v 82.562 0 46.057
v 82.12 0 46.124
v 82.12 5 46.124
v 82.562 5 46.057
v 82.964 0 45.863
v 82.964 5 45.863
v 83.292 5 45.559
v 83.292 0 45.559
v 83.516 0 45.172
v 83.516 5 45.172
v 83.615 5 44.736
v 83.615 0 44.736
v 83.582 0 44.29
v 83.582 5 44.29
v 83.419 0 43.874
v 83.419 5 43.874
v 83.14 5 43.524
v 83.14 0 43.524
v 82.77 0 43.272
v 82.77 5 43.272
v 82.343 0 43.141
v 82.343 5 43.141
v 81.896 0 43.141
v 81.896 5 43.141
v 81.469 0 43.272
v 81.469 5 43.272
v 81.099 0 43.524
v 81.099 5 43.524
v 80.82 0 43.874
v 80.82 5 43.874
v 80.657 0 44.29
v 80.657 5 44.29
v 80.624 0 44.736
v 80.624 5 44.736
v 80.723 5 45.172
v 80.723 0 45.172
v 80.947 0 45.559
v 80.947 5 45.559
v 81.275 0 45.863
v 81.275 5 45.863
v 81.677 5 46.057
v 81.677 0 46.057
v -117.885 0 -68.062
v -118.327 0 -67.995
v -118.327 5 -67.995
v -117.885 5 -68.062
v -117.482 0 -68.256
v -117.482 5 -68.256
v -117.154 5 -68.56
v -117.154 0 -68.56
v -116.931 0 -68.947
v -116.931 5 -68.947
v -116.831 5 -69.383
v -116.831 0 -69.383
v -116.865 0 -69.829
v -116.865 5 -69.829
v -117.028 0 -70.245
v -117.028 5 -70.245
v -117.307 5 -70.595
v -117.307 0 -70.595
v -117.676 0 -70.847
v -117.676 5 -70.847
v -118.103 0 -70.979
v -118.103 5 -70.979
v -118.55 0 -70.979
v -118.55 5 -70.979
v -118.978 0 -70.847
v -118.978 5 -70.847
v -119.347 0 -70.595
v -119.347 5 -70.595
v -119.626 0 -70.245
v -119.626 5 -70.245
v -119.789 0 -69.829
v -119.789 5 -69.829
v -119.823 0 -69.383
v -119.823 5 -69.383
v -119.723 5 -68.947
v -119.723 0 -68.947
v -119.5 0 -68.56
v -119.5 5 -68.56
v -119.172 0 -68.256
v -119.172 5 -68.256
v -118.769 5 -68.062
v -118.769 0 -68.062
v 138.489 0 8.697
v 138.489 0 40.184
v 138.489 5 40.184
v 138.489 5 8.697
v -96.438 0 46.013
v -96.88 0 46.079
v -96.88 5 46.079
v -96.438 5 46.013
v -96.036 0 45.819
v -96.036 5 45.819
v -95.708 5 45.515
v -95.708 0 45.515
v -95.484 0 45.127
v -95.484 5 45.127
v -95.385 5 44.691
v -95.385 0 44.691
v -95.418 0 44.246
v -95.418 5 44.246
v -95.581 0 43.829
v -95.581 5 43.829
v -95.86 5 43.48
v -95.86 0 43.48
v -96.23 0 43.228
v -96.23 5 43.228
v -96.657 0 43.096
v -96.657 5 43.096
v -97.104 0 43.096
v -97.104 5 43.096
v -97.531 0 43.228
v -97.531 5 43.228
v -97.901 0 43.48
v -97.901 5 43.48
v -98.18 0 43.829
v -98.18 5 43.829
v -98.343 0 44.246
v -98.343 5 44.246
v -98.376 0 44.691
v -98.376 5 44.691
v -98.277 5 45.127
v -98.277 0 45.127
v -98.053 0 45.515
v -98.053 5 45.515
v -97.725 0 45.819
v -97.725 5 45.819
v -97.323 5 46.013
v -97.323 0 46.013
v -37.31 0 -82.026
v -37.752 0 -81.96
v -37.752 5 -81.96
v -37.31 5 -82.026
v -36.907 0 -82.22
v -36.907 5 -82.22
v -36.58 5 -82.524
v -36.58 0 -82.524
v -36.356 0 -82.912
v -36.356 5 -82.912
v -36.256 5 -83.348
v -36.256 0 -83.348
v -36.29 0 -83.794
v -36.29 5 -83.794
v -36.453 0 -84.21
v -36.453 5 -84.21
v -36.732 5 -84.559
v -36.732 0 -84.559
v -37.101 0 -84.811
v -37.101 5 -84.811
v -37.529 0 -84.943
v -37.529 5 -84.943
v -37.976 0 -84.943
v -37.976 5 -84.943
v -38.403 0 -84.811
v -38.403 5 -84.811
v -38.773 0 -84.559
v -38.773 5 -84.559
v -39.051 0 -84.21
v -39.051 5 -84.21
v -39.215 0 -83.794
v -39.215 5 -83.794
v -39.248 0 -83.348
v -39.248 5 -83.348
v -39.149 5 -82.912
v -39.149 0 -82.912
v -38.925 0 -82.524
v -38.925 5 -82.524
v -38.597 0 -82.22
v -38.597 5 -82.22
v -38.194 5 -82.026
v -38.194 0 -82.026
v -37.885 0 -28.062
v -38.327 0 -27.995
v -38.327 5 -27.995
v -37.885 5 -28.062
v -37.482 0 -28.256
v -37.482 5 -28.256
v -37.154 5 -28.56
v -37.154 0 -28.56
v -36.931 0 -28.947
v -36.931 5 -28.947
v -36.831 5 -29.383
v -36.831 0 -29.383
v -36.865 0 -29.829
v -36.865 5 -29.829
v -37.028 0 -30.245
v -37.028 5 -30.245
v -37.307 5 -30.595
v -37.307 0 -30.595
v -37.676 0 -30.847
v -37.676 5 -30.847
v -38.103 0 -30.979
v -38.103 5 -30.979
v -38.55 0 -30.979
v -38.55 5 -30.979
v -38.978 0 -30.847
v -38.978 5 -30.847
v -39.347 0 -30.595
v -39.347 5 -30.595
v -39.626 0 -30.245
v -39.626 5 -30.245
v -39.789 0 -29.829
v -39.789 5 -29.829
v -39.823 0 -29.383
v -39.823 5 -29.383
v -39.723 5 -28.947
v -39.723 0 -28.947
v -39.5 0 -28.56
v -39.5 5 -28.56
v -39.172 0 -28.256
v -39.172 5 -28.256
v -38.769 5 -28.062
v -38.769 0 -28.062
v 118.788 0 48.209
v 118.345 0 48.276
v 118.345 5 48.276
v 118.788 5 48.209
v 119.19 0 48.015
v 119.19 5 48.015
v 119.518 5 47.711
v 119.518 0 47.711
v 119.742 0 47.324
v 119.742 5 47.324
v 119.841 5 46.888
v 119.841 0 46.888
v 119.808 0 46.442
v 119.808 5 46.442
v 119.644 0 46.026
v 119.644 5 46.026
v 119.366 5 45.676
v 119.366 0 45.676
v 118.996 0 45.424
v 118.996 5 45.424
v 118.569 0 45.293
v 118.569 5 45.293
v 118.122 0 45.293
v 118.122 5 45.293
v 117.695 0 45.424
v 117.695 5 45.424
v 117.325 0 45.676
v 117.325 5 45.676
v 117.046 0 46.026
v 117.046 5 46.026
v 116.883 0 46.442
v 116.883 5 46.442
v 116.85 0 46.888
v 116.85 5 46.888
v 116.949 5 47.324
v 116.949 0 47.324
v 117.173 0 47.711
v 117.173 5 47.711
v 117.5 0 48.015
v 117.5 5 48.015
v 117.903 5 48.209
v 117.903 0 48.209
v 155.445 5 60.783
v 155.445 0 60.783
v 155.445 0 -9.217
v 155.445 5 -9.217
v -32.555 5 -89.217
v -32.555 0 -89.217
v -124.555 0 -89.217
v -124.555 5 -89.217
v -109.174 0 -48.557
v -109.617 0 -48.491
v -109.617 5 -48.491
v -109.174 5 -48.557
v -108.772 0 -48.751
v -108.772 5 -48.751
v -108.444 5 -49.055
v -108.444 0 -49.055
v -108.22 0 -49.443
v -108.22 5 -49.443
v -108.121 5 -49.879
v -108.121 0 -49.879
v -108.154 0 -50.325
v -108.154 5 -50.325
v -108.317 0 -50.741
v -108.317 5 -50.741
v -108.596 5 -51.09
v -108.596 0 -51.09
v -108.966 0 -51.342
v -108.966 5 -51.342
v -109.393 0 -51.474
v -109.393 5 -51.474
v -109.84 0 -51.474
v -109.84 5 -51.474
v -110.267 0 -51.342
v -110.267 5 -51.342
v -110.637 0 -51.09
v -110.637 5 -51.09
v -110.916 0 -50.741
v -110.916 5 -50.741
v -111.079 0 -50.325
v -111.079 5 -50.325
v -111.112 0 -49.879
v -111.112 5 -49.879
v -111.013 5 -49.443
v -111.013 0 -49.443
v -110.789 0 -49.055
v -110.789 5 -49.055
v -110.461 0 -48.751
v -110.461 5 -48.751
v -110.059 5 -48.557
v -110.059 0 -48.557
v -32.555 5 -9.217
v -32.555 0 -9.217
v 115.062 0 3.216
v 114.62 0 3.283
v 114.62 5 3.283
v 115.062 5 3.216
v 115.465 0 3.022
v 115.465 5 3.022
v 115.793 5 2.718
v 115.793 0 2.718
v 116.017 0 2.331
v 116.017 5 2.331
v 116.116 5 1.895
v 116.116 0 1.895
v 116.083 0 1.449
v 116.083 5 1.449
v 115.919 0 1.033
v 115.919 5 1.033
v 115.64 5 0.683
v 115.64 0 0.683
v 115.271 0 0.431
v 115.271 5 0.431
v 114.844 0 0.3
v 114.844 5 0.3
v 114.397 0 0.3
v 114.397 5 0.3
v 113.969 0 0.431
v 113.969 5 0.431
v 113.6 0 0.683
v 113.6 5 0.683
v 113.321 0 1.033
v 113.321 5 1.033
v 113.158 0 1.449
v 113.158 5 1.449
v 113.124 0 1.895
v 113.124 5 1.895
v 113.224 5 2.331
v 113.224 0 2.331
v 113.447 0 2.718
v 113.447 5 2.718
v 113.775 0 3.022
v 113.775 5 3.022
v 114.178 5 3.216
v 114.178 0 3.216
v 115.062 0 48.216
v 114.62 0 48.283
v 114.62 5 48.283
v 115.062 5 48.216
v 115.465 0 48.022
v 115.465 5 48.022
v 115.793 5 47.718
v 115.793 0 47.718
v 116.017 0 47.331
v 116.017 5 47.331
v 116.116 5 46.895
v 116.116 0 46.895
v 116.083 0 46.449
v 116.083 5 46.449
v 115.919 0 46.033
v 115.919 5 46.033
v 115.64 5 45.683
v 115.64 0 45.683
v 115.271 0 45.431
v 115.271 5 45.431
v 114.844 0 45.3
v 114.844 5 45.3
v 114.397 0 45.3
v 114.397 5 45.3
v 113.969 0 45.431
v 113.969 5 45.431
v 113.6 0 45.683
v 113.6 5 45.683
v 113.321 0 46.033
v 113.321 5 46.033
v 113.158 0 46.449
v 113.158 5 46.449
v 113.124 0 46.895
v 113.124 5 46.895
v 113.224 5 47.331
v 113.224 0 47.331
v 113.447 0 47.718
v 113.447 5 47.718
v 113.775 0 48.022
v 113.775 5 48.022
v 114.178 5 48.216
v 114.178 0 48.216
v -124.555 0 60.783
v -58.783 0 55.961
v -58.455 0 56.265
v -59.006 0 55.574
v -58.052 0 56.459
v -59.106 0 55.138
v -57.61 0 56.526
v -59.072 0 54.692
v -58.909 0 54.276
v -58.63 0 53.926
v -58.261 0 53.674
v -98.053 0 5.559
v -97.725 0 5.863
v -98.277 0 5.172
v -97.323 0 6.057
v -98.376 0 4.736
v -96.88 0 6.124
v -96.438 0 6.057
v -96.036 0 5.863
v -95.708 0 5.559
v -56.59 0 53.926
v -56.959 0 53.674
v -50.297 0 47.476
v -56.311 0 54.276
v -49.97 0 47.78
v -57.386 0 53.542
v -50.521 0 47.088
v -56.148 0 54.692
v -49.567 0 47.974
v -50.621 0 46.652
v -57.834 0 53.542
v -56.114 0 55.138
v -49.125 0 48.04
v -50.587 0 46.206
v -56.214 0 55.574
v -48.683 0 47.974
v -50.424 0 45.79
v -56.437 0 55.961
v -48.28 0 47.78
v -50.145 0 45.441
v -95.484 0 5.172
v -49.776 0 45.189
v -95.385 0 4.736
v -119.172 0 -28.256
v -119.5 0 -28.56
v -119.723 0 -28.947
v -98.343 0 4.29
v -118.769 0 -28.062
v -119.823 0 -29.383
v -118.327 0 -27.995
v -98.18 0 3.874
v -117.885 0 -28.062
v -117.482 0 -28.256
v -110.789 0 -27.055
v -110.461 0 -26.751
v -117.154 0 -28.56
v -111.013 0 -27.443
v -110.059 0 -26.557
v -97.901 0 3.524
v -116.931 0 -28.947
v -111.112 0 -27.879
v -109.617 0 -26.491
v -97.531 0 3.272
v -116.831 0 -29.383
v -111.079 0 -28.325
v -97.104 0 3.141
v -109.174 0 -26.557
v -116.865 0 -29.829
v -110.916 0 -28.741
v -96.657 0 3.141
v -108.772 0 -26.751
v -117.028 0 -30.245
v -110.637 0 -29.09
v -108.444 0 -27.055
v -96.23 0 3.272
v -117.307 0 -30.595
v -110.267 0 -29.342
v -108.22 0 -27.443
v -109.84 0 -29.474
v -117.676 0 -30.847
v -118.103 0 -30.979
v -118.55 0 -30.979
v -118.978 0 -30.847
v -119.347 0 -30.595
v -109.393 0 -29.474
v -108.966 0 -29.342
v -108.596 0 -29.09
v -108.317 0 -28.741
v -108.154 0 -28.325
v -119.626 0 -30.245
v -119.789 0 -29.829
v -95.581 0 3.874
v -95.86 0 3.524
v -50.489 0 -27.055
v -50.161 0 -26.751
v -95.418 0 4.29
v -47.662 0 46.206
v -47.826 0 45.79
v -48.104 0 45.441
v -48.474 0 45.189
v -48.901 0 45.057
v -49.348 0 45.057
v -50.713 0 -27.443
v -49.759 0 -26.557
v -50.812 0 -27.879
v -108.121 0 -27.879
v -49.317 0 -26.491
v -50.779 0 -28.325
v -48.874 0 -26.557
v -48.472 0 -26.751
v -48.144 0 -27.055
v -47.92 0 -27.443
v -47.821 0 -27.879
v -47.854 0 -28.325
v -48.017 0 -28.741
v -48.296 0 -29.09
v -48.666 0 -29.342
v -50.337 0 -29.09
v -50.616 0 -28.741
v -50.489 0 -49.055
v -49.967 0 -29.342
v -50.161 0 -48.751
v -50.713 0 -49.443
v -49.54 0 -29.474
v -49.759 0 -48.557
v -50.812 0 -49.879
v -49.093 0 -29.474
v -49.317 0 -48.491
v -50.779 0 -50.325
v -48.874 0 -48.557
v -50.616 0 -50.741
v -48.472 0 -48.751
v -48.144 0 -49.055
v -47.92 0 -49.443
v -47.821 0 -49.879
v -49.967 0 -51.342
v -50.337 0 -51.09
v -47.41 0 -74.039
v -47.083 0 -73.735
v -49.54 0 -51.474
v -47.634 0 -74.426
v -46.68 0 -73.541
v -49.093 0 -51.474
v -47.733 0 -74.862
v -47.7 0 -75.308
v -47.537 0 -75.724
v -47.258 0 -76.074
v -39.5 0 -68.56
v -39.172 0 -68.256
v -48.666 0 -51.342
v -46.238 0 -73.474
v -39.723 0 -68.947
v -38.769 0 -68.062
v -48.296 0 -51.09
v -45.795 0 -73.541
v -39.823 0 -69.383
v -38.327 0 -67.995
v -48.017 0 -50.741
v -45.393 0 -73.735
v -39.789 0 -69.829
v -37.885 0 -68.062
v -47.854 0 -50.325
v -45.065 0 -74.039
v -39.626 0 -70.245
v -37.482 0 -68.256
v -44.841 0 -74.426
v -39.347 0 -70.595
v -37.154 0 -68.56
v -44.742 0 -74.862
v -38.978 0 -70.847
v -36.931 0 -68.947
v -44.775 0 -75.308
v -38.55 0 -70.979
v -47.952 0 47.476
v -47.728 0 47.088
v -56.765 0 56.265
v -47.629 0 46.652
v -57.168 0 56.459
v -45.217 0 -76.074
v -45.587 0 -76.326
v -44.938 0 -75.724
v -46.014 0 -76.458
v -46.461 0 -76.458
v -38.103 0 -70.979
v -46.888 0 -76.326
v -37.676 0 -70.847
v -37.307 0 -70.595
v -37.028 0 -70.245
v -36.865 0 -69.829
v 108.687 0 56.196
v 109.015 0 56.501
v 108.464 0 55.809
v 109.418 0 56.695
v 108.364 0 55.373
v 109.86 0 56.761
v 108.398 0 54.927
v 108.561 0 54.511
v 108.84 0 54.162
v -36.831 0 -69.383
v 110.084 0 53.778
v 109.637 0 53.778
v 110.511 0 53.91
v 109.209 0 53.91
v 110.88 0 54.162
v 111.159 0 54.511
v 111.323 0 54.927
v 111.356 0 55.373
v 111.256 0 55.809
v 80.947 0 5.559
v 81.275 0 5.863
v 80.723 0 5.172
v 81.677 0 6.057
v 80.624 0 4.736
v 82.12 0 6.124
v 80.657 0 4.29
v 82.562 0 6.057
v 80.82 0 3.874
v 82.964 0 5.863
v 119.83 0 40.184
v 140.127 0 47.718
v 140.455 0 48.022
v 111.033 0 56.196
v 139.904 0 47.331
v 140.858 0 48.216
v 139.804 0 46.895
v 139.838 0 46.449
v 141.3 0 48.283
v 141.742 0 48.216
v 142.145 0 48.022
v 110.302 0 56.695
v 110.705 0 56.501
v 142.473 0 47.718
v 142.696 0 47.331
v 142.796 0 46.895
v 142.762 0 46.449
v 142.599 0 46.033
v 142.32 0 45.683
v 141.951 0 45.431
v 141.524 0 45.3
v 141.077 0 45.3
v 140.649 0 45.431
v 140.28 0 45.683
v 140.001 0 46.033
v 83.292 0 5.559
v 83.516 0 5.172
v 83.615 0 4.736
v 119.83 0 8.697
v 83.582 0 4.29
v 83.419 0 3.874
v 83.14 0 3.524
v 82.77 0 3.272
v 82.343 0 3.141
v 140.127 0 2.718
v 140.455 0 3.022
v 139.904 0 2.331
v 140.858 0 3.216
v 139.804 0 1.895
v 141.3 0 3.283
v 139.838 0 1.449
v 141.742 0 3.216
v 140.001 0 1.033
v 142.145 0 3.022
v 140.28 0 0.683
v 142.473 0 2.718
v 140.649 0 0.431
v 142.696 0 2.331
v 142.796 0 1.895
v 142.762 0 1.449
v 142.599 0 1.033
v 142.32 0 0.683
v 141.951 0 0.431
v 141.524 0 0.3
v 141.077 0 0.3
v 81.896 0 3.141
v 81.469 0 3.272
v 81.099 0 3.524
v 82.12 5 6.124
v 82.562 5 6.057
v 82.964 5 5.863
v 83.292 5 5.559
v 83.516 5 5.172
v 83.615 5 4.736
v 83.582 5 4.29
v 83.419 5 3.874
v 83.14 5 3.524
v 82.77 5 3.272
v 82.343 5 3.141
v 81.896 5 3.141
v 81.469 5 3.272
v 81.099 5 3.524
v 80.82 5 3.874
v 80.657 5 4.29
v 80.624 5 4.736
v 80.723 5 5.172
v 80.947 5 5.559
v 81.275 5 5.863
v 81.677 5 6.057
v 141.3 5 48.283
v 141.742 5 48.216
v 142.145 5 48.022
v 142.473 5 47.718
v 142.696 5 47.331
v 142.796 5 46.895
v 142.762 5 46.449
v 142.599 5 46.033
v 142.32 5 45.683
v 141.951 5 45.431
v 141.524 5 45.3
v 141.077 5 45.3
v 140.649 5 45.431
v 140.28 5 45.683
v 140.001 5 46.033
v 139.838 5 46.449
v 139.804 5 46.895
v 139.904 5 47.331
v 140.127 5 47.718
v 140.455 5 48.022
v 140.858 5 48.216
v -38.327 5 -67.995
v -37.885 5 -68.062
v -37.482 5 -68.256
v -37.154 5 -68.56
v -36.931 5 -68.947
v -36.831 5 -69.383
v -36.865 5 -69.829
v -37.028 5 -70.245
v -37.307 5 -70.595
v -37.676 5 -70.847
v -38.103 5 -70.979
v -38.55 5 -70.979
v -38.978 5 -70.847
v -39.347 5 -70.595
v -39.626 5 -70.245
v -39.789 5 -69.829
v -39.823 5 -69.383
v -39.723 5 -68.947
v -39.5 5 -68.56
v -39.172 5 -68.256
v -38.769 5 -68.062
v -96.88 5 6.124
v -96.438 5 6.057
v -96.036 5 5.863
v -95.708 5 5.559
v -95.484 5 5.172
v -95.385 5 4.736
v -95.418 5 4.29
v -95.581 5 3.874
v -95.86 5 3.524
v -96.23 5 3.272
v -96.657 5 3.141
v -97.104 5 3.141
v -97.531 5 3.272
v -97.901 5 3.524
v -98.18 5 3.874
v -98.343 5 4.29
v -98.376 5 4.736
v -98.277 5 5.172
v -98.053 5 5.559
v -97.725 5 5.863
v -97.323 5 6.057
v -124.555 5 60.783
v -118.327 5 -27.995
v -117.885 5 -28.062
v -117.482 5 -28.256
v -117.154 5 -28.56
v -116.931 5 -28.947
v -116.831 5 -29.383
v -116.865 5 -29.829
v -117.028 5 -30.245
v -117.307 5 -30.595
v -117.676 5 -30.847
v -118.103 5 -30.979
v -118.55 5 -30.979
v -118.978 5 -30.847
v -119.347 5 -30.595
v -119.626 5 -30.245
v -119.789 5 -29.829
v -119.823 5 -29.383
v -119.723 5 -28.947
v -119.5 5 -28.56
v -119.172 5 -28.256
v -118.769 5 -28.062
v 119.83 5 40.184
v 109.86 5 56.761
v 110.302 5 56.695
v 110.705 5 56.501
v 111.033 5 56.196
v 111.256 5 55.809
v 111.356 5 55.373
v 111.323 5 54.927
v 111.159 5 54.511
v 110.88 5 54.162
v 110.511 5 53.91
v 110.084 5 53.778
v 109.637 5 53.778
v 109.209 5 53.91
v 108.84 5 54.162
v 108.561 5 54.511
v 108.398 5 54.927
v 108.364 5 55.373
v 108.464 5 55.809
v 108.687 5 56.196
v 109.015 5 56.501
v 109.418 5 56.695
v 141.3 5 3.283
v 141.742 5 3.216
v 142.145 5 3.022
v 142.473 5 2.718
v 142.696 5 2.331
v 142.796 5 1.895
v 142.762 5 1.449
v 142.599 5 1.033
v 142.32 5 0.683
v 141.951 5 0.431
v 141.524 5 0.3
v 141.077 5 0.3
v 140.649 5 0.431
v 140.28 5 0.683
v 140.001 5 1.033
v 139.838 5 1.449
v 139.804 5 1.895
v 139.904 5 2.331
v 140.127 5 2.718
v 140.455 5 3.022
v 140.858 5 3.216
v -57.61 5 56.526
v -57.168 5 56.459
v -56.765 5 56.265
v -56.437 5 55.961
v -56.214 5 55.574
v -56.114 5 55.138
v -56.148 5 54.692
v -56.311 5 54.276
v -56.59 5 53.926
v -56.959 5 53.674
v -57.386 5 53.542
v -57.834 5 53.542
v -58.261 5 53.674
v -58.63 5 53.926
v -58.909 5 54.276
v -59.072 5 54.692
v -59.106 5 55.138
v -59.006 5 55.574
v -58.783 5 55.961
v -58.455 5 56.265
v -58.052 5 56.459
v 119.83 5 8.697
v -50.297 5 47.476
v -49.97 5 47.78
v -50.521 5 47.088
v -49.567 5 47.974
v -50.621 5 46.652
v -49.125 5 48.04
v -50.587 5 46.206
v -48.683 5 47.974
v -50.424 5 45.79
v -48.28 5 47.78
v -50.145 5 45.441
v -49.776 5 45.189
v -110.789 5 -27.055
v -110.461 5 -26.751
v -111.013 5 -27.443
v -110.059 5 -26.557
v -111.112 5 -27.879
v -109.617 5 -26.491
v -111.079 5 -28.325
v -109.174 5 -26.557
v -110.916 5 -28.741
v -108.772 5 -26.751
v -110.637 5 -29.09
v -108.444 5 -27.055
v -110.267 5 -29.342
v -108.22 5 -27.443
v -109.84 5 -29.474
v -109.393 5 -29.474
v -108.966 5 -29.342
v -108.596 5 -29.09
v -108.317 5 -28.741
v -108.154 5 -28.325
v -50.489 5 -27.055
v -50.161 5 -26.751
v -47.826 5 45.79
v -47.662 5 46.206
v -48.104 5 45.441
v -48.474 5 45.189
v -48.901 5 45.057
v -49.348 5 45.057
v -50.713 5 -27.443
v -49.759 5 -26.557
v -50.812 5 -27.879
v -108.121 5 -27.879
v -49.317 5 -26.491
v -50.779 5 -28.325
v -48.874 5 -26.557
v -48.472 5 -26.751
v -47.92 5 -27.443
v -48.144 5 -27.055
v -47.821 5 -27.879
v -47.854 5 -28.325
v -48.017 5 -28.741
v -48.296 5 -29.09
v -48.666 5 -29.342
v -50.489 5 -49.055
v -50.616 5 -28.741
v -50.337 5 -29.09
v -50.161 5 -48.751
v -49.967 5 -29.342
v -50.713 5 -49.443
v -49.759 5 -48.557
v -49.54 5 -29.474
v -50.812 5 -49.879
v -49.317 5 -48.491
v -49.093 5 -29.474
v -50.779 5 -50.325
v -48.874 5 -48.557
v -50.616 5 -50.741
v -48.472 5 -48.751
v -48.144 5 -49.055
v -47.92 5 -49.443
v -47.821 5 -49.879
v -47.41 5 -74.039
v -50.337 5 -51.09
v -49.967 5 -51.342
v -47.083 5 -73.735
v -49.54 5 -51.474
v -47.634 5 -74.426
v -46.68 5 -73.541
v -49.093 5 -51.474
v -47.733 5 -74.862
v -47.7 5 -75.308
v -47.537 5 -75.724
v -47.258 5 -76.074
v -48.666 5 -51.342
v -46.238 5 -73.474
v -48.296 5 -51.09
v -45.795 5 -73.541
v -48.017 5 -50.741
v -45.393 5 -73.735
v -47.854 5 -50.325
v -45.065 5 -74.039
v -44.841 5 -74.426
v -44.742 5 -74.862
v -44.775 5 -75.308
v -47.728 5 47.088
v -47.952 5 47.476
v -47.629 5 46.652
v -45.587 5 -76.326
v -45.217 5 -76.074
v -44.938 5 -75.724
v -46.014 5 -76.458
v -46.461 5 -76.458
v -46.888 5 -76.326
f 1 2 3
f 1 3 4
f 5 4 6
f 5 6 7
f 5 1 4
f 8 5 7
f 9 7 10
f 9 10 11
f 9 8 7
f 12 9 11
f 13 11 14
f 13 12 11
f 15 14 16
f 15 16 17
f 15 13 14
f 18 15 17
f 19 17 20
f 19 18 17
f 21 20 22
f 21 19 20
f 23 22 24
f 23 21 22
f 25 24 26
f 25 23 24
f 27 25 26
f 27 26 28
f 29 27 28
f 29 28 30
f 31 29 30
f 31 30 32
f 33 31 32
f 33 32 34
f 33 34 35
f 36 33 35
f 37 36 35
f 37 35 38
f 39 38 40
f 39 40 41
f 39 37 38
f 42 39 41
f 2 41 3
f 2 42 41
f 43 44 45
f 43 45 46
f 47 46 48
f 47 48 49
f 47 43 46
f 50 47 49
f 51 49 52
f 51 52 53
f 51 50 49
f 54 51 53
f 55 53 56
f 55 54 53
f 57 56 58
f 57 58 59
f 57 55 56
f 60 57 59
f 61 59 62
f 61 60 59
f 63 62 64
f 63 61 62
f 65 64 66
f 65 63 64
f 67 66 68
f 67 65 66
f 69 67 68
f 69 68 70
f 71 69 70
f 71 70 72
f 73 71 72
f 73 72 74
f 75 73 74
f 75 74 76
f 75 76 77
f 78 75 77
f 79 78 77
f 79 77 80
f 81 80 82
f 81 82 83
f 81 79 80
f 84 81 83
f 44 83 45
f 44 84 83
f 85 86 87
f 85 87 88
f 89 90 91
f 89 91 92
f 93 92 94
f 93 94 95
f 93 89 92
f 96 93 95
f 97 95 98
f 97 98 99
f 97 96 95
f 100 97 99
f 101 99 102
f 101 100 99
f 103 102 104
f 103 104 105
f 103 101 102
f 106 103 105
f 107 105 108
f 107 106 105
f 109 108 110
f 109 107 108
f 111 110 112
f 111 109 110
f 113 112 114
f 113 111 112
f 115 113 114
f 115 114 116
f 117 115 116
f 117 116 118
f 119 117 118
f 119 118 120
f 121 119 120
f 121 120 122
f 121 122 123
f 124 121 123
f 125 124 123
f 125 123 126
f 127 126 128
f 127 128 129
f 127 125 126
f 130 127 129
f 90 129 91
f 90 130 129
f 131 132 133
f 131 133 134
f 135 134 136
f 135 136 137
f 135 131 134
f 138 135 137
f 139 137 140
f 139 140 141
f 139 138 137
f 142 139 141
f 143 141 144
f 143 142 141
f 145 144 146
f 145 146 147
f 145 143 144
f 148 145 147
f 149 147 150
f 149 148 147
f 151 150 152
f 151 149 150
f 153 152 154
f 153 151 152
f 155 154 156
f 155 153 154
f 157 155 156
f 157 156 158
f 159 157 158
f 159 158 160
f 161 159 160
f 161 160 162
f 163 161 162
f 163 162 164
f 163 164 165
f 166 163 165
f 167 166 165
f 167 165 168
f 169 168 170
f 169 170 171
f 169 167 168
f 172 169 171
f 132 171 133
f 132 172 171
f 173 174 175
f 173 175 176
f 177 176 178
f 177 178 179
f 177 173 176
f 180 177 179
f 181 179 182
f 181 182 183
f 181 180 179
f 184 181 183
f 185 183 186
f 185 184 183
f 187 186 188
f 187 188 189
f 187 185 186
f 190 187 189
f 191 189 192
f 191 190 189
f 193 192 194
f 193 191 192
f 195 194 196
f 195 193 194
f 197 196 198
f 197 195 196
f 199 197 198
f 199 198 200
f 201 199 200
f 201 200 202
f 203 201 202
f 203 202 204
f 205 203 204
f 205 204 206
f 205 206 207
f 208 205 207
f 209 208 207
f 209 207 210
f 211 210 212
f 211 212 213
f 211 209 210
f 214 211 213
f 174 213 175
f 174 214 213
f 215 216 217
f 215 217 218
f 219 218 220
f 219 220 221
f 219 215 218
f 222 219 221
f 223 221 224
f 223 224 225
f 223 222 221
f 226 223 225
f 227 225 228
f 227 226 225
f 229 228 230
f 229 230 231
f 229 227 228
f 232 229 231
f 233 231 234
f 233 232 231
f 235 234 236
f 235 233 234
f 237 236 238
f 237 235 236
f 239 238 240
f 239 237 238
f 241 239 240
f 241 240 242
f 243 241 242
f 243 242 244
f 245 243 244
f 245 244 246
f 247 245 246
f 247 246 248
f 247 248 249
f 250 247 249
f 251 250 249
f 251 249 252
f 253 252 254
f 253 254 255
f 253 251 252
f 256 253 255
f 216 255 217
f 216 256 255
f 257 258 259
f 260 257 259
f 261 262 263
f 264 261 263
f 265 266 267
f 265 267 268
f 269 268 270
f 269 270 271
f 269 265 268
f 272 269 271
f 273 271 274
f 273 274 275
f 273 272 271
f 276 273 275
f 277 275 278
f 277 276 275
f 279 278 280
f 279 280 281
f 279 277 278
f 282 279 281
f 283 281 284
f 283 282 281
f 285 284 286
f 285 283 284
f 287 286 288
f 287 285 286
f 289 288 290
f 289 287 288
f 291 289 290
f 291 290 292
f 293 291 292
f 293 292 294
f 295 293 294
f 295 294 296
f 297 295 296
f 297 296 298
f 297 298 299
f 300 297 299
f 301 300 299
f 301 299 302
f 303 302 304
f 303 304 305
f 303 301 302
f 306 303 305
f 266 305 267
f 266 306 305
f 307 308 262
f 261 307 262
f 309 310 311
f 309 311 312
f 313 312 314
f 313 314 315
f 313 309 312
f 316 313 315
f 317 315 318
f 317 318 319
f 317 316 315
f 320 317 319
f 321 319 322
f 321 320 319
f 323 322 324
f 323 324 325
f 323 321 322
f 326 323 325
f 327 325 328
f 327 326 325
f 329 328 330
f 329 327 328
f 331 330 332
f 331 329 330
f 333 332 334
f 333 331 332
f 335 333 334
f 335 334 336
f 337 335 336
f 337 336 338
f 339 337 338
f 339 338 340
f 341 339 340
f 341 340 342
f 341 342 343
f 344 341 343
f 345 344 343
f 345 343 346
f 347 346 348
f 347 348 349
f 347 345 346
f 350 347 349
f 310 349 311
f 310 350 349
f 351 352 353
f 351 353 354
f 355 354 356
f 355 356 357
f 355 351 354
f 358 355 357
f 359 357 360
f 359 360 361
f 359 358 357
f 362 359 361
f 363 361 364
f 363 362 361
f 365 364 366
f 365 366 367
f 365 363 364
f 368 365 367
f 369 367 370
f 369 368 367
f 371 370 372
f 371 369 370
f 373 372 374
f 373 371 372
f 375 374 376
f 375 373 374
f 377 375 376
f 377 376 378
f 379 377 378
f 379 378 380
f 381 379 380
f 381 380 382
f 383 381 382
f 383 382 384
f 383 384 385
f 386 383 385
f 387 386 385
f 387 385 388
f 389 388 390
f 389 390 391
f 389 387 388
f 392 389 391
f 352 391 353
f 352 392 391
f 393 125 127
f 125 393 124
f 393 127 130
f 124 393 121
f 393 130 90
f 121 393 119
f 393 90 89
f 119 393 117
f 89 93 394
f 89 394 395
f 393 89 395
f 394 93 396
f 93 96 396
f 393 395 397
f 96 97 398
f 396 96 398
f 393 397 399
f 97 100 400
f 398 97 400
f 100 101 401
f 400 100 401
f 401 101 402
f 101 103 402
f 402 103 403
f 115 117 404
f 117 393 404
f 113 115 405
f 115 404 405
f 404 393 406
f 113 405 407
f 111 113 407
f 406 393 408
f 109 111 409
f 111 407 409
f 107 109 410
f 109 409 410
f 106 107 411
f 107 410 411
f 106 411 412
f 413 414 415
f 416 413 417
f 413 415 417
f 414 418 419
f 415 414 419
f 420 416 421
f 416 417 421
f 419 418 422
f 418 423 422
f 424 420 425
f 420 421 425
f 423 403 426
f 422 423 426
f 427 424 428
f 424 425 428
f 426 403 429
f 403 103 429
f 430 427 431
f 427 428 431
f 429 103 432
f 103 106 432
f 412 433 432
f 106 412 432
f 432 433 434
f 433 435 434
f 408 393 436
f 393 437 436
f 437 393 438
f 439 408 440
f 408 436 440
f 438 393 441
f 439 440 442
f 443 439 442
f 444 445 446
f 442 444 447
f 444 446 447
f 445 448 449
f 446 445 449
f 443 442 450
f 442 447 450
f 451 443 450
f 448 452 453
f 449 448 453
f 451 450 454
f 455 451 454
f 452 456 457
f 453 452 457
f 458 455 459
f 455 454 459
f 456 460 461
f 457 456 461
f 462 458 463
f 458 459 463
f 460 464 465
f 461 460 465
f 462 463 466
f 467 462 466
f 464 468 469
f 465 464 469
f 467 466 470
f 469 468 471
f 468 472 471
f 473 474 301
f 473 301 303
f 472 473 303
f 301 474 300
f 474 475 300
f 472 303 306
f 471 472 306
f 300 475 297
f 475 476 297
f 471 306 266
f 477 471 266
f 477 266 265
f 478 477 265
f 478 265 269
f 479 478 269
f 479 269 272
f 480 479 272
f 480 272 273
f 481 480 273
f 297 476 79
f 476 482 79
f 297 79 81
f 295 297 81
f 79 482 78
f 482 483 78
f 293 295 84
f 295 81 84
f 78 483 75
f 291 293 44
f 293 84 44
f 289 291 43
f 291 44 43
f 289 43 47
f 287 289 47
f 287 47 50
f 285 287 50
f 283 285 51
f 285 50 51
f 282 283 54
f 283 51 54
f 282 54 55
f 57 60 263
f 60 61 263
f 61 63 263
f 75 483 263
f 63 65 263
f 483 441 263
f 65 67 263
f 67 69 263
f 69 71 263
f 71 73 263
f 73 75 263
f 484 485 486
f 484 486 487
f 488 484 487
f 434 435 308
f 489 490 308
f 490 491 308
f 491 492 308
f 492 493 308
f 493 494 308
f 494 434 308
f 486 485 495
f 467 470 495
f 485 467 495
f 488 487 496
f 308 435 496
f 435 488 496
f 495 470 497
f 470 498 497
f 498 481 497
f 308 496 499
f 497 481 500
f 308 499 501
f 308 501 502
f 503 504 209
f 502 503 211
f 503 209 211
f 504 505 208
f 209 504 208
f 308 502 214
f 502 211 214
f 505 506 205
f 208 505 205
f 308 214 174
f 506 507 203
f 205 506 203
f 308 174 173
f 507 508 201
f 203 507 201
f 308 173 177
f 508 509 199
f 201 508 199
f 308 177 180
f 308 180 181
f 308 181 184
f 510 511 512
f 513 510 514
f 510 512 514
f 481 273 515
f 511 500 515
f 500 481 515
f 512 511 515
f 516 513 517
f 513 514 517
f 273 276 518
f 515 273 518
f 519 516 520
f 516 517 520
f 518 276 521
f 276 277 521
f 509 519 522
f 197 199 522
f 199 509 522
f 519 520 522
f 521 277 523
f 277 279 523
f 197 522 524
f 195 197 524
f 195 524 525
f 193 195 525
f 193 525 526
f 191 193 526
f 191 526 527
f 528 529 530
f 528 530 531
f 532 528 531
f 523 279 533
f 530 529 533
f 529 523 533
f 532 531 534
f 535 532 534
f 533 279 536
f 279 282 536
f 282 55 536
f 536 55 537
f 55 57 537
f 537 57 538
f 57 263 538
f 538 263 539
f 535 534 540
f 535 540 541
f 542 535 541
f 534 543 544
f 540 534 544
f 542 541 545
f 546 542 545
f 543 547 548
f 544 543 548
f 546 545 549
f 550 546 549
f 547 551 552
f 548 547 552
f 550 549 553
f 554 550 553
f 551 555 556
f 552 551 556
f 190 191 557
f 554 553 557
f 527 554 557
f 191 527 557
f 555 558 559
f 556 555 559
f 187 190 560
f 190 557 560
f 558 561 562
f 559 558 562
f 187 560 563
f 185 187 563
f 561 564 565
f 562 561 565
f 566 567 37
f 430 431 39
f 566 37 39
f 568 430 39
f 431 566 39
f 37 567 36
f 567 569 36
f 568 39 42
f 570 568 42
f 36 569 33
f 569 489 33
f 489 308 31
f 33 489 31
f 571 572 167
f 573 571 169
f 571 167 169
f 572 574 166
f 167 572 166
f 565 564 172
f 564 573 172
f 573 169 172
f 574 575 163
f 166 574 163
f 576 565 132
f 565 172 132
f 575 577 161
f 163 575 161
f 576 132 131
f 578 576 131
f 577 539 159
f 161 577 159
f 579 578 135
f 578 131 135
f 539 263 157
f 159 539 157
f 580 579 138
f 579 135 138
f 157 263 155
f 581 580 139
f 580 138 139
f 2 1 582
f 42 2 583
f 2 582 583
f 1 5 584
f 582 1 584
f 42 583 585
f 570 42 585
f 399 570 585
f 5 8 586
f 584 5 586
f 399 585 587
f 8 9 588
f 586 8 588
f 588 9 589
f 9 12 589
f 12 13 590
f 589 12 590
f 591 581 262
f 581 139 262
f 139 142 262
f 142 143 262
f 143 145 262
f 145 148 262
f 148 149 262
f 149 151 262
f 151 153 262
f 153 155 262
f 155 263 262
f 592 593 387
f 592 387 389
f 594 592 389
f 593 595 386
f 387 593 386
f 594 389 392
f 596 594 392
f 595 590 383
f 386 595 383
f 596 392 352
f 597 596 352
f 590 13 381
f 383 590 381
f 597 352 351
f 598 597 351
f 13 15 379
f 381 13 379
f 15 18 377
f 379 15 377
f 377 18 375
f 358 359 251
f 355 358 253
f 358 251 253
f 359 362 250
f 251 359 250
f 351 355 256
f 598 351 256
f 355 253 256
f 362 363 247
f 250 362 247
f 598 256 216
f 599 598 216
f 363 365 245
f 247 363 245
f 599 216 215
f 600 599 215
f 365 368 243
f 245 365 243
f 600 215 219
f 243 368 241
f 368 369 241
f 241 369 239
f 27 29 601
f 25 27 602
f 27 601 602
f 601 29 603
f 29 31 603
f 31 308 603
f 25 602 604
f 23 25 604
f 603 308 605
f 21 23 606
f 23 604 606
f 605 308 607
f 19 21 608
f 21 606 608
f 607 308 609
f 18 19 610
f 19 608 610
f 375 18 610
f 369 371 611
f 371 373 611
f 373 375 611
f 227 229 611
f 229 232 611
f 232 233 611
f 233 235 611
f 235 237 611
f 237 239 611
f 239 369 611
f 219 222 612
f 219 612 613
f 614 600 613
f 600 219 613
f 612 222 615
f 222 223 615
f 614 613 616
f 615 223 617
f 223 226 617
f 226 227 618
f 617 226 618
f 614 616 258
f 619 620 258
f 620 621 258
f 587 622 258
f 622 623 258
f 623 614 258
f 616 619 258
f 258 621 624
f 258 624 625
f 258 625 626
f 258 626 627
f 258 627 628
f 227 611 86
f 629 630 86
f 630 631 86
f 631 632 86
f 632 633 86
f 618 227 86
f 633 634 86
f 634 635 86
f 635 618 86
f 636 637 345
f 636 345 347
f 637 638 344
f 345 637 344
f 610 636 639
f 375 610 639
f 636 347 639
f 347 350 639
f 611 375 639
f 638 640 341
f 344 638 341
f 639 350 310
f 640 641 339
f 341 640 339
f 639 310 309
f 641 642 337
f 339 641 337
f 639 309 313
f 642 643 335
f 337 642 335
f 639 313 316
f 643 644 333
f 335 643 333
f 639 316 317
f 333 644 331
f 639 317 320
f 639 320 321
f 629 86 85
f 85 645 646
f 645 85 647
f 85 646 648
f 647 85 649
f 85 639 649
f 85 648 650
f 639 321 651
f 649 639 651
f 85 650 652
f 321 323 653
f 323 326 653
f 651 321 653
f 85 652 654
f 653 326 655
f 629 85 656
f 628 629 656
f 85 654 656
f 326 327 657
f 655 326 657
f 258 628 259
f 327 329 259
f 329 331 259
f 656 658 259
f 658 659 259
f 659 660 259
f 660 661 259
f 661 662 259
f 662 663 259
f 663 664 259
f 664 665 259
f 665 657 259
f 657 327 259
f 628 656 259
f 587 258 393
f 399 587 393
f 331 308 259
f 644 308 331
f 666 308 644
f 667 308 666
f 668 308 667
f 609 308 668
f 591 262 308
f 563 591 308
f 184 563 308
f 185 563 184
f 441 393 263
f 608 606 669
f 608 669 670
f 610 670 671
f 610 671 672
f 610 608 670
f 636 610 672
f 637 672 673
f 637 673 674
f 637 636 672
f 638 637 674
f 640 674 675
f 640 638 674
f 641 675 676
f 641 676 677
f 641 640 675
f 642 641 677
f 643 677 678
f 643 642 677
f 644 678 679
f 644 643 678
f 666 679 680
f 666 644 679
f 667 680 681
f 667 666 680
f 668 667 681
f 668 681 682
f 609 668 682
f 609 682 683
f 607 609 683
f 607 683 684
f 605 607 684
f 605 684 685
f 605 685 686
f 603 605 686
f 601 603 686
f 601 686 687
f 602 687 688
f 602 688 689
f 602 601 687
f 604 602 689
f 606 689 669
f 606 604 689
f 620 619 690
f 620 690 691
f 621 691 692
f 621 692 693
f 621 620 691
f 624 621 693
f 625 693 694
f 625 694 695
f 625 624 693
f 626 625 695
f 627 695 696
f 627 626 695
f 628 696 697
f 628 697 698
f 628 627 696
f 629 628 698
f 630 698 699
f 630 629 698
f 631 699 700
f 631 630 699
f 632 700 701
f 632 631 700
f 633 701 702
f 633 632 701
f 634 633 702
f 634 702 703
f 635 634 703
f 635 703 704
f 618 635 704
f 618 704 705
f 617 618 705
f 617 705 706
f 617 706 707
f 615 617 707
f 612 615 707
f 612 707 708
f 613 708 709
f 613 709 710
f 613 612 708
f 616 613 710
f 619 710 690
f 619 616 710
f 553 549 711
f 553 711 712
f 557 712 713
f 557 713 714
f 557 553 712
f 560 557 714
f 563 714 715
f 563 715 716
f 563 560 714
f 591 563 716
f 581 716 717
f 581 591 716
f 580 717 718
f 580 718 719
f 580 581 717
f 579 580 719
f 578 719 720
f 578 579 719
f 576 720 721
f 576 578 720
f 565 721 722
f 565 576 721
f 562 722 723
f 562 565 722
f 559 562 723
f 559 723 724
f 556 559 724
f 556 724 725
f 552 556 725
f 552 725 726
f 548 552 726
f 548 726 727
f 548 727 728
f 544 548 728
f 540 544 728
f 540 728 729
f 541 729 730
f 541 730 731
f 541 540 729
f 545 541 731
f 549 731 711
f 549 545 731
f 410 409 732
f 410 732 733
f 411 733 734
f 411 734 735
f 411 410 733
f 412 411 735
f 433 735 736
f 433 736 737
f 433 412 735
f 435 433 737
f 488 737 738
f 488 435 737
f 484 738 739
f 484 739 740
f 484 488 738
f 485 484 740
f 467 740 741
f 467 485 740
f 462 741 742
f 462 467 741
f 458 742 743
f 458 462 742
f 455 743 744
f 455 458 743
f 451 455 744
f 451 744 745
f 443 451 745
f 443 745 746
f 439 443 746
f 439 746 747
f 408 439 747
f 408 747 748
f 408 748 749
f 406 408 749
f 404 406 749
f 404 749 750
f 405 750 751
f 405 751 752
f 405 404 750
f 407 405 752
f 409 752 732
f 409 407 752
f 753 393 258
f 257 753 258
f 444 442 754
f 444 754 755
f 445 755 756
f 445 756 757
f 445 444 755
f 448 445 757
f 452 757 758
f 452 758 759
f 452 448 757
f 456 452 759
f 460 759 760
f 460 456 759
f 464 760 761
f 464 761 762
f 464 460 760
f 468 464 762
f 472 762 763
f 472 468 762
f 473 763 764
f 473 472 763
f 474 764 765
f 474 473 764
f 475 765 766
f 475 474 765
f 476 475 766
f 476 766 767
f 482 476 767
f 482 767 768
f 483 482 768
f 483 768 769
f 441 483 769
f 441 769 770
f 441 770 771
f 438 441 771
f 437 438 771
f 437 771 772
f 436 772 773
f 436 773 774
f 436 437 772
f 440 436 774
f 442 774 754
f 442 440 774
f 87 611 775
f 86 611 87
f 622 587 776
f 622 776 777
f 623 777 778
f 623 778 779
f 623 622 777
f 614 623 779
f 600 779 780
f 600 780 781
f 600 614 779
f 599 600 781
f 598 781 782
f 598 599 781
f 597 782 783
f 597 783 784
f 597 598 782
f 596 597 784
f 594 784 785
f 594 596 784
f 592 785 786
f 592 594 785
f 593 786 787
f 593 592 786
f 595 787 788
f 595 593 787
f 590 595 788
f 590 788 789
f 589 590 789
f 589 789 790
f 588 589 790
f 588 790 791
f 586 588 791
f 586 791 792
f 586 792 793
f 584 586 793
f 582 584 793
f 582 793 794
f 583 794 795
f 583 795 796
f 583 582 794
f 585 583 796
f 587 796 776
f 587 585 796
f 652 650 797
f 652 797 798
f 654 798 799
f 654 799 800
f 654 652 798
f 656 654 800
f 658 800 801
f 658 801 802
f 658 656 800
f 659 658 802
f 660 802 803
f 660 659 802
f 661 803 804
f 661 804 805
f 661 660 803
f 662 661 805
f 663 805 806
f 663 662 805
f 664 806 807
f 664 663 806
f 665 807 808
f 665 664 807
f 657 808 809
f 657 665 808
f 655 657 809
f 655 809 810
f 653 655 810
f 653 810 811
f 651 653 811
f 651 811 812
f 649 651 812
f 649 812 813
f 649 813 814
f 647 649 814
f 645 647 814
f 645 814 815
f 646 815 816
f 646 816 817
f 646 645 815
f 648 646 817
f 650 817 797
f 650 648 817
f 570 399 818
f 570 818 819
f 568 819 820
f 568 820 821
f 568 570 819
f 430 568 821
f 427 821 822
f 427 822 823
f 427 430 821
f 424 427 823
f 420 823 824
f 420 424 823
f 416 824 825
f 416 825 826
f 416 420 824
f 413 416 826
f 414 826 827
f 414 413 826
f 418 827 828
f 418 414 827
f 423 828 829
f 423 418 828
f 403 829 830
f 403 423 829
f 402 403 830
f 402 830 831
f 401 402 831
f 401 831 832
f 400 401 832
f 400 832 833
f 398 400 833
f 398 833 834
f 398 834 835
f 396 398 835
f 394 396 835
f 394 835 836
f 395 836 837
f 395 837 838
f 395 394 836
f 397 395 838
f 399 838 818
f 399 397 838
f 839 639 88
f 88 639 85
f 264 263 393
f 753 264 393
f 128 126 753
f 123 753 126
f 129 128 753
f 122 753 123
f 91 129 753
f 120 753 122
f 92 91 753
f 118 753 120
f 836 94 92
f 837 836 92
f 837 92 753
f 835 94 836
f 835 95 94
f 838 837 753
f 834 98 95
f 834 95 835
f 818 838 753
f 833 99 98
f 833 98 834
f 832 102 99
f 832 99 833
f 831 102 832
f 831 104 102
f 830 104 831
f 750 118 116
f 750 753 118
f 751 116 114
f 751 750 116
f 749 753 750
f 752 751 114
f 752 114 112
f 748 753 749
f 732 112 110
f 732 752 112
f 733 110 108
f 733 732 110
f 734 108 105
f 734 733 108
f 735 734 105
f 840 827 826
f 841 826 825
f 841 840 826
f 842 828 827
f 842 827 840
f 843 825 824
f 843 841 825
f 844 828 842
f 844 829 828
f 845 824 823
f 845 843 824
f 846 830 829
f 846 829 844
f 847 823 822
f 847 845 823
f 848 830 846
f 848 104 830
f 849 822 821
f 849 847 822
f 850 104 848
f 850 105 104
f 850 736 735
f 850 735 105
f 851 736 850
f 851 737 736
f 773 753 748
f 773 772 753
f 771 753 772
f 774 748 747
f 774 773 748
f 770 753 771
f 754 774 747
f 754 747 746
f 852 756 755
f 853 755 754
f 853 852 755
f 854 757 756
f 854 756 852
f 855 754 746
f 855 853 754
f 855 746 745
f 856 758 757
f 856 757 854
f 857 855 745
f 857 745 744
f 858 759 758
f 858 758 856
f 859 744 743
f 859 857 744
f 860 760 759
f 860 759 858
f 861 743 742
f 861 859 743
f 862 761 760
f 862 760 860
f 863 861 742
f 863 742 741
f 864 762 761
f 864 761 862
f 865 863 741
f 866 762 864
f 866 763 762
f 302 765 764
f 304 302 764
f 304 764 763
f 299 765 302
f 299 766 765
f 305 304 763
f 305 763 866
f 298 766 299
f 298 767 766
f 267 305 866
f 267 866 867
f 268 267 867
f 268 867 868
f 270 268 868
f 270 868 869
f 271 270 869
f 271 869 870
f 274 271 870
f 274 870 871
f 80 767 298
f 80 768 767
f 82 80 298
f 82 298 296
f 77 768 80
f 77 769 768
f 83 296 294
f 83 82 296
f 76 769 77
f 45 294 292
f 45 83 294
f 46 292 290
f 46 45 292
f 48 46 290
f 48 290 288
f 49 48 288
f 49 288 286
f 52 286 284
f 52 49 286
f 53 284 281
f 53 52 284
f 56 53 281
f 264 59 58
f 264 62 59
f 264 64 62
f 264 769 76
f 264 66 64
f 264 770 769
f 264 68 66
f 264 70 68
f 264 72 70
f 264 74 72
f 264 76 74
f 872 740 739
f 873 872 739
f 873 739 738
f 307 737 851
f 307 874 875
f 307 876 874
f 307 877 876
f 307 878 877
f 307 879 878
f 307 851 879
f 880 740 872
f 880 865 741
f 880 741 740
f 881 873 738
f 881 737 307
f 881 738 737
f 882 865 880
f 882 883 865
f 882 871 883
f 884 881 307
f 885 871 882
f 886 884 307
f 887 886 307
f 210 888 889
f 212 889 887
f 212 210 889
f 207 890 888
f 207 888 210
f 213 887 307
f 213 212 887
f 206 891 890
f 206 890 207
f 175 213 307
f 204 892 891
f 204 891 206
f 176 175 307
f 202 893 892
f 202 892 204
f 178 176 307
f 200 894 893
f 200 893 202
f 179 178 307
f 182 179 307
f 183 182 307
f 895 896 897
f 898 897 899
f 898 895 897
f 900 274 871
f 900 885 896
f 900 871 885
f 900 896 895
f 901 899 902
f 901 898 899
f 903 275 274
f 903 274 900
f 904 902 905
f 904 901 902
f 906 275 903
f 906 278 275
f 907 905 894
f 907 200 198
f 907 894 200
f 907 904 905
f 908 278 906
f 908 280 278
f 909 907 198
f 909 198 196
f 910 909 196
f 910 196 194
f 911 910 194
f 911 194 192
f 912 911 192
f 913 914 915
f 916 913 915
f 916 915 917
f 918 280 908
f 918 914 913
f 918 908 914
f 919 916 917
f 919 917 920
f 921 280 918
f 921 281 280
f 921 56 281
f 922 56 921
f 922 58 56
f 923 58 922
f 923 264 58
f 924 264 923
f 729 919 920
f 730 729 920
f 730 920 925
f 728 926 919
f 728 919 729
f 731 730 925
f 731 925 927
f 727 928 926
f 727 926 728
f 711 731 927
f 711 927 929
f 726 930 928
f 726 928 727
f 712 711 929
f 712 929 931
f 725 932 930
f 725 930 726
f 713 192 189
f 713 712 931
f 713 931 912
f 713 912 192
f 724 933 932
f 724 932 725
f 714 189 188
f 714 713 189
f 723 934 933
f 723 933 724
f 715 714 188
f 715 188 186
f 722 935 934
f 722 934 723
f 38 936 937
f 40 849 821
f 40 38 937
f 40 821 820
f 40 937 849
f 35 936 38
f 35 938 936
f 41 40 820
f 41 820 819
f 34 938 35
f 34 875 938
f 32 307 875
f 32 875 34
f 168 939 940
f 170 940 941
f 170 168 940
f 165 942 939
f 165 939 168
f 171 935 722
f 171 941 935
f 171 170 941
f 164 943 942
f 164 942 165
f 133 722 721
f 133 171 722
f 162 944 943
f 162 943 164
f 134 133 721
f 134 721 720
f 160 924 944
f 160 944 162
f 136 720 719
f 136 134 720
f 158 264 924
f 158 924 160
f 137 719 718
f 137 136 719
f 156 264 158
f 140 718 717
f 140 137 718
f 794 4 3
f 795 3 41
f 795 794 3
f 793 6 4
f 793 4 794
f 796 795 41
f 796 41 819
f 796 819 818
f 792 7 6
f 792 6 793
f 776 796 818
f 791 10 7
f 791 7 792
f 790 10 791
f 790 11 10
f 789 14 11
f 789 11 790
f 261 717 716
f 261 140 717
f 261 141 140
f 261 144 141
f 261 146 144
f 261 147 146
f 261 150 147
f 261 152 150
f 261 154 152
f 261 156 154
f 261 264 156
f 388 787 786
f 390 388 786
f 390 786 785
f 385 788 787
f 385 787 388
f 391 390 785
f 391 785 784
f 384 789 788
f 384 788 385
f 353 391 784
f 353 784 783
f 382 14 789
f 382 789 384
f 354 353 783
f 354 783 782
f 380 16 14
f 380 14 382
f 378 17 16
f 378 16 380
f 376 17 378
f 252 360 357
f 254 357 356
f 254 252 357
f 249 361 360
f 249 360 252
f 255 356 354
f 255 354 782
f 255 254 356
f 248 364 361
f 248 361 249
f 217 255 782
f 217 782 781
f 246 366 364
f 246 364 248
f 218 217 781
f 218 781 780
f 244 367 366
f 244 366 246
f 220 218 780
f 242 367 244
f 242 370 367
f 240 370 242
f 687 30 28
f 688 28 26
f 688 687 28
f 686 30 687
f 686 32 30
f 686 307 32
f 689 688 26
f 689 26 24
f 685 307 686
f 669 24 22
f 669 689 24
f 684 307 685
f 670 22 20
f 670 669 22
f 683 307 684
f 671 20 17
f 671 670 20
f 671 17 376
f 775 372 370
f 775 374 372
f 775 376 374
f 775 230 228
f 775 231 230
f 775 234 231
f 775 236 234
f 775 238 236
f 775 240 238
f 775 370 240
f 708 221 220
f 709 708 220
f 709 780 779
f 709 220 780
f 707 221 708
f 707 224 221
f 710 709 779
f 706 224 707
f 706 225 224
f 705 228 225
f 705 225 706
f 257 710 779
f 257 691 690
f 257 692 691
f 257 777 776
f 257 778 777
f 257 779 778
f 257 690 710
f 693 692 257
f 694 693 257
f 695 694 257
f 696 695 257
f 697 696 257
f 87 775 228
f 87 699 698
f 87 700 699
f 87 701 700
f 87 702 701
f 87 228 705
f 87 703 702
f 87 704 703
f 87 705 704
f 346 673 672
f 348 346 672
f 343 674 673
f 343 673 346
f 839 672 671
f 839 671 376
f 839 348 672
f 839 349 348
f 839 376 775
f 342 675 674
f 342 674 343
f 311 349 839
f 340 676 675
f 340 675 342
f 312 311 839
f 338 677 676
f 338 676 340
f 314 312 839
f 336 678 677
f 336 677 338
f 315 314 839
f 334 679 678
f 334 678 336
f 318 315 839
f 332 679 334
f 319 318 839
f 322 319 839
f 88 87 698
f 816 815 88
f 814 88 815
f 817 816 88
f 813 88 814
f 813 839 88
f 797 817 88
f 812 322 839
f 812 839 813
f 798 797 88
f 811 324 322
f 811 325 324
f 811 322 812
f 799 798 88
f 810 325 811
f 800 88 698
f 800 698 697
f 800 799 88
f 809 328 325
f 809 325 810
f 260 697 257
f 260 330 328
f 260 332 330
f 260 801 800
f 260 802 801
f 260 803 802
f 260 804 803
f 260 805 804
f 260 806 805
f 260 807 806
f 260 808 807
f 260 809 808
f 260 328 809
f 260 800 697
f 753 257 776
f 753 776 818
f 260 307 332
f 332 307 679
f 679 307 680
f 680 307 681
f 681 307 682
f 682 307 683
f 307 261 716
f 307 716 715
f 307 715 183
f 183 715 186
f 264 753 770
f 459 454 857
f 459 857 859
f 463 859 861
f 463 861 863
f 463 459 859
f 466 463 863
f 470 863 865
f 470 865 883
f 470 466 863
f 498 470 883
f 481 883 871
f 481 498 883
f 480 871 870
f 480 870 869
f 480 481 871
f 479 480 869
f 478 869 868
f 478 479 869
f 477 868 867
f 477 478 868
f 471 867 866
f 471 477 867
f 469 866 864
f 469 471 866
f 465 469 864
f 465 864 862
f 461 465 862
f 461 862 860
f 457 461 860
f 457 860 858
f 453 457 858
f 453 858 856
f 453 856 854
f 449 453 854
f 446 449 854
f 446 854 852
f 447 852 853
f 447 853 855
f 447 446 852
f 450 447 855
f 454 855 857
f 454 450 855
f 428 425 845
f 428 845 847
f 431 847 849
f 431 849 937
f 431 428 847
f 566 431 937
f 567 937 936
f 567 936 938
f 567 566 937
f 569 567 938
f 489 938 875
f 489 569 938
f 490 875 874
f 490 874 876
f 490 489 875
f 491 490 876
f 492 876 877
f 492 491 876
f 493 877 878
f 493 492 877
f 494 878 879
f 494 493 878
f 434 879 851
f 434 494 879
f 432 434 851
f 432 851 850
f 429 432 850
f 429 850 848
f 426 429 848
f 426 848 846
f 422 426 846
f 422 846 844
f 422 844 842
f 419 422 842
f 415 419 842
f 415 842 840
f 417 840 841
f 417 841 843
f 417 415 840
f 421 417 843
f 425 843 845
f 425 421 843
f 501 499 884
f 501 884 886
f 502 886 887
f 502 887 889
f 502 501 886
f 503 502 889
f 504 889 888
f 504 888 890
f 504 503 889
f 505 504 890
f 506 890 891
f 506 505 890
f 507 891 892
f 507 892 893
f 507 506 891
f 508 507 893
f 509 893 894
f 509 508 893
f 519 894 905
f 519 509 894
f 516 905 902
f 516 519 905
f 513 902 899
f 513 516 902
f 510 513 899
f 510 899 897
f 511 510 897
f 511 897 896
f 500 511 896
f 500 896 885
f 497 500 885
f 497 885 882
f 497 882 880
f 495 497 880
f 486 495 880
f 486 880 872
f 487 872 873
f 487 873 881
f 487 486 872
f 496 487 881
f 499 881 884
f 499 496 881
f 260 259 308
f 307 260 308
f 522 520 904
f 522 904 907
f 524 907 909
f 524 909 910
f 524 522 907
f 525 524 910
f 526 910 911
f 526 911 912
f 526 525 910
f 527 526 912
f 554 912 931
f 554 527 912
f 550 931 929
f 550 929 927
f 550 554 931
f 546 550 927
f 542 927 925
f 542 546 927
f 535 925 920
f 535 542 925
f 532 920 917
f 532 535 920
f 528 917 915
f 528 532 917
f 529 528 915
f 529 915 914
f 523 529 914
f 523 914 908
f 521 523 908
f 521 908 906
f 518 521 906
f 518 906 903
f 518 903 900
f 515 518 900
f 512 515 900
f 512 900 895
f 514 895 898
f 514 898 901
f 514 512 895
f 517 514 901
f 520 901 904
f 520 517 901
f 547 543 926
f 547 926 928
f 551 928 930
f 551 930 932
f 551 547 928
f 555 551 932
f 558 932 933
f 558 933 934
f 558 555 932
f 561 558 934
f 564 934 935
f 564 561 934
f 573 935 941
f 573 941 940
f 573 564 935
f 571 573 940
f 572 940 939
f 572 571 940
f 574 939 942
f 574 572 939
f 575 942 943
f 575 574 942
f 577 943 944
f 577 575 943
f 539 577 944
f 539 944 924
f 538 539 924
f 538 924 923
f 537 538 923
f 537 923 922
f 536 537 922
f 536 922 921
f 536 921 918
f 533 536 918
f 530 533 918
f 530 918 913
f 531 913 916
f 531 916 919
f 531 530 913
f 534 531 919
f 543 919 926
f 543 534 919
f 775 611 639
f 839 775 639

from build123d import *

# Parameters (mm, degrees)
SKETCH1_R           = 1.5
SKETCH1_W           = 18.658985537
SKETCH1_H           = 31.487038094
BOSS_EXTRUDE1_DEPTH = 5


with BuildPart() as part:
    # Sketch1 → Boss-Extrude1 (new body)
    with BuildSketch(Plane(origin=(0, 0, 0), x_dir=(1, 0, 0), z_dir=(0, 1, 0))):
        Polygon((-124.555160142, -60.782918149), (155.444839858, -60.782918149), (155.444839858, 9.217081851), (-32.555160142, 9.217081851), (-32.555160142, 89.217081851), (-124.555160142, 89.217081851), align=None)
        with Locations(Location((-96.88048066, -44.579371447, 0), (0, 0, 270))):
            Circle(SKETCH1_R, mode=Mode.SUBTRACT)
        with Locations(Location((-57.609979708, -55.025558837, 0), (0, 0, 270))):
            Circle(SKETCH1_R, mode=Mode.SUBTRACT)
        with Locations(Location((-49.124698334, -46.540277462, 0), (0, 0, 270))):
            Circle(SKETCH1_R, mode=Mode.SUBTRACT)
        with Locations(Location((-96.88048066, -4.623906574, 0), (0, 0, 270))):
            Circle(SKETCH1_R, mode=Mode.SUBTRACT)
        with Locations(Location((82.11951934, -44.623906574, 0), (0, 0, 270))):
            Circle(SKETCH1_R, mode=Mode.SUBTRACT)
        with Locations(Location((109.860128873, -55.261198979, 0), (0, 0, 270))):
            Circle(SKETCH1_R, mode=Mode.SUBTRACT)
        with Locations(Location((114.620218271, -46.782918149, 0), (0, 0, 270))):
            Circle(SKETCH1_R, mode=Mode.SUBTRACT)
        with Locations(Location((118.345410248, -46.775917605, 0), (0, 0, 270))):
            Circle(SKETCH1_R, mode=Mode.SUBTRACT)
        with Locations(Location((141.300092758, -46.782918149, 0), (0, 0, 270))):
            Circle(SKETCH1_R, mode=Mode.SUBTRACT)
        with Locations((129.159877134, -24.440324762)):
            Rectangle(SKETCH1_W, SKETCH1_H, mode=Mode.SUBTRACT)
        with Locations(Location((82.11951934, -4.623906574, 0), (0, 0, 270))):
            Circle(SKETCH1_R, mode=Mode.SUBTRACT)
        with Locations(Location((114.620218271, -1.782918149, 0), (0, 0, 270))):
            Circle(SKETCH1_R, mode=Mode.SUBTRACT)
        with Locations(Location((141.300092758, -1.782918149, 0), (0, 0, 270))):
            Circle(SKETCH1_R, mode=Mode.SUBTRACT)
        with Locations(Location((-37.752255096, 83.459722538, 0), (0, 0, 270))):
            Circle(SKETCH1_R, mode=Mode.SUBTRACT)
        with Locations(Location((-109.616514697, 27.990725731, 0), (0, 0, 270))):
            Circle(SKETCH1_R, mode=Mode.SUBTRACT)
        with Locations(Location((-118.326917326, 29.495275711, 0), (0, 0, 270))):
            Circle(SKETCH1_R, mode=Mode.SUBTRACT)
        with Locations(Location((-109.616514697, 49.990725731, 0), (0, 0, 270))):
            Circle(SKETCH1_R, mode=Mode.SUBTRACT)
        with Locations(Location((-49.316514697, 27.990725731, 0), (0, 0, 270))):
            Circle(SKETCH1_R, mode=Mode.SUBTRACT)
        with Locations(Location((-38.326917326, 29.495275711, 0), (0, 0, 270))):
            Circle(SKETCH1_R, mode=Mode.SUBTRACT)
        with Locations(Location((-49.316514697, 49.990725731, 0), (0, 0, 270))):
            Circle(SKETCH1_R, mode=Mode.SUBTRACT)
        with Locations(Location((-118.326917326, 69.495275711, 0), (0, 0, 270))):
            Circle(SKETCH1_R, mode=Mode.SUBTRACT)
        with Locations(Location((-38.326917326, 69.495275711, 0), (0, 0, 270))):
            Circle(SKETCH1_R, mode=Mode.SUBTRACT)
        with Locations(Location((-46.23753647, 74.974441163, 0), (0, 0, 270))):
            Circle(SKETCH1_R, mode=Mode.SUBTRACT)
    extrude(amount=BOSS_EXTRUDE1_DEPTH)


solid = part.part
